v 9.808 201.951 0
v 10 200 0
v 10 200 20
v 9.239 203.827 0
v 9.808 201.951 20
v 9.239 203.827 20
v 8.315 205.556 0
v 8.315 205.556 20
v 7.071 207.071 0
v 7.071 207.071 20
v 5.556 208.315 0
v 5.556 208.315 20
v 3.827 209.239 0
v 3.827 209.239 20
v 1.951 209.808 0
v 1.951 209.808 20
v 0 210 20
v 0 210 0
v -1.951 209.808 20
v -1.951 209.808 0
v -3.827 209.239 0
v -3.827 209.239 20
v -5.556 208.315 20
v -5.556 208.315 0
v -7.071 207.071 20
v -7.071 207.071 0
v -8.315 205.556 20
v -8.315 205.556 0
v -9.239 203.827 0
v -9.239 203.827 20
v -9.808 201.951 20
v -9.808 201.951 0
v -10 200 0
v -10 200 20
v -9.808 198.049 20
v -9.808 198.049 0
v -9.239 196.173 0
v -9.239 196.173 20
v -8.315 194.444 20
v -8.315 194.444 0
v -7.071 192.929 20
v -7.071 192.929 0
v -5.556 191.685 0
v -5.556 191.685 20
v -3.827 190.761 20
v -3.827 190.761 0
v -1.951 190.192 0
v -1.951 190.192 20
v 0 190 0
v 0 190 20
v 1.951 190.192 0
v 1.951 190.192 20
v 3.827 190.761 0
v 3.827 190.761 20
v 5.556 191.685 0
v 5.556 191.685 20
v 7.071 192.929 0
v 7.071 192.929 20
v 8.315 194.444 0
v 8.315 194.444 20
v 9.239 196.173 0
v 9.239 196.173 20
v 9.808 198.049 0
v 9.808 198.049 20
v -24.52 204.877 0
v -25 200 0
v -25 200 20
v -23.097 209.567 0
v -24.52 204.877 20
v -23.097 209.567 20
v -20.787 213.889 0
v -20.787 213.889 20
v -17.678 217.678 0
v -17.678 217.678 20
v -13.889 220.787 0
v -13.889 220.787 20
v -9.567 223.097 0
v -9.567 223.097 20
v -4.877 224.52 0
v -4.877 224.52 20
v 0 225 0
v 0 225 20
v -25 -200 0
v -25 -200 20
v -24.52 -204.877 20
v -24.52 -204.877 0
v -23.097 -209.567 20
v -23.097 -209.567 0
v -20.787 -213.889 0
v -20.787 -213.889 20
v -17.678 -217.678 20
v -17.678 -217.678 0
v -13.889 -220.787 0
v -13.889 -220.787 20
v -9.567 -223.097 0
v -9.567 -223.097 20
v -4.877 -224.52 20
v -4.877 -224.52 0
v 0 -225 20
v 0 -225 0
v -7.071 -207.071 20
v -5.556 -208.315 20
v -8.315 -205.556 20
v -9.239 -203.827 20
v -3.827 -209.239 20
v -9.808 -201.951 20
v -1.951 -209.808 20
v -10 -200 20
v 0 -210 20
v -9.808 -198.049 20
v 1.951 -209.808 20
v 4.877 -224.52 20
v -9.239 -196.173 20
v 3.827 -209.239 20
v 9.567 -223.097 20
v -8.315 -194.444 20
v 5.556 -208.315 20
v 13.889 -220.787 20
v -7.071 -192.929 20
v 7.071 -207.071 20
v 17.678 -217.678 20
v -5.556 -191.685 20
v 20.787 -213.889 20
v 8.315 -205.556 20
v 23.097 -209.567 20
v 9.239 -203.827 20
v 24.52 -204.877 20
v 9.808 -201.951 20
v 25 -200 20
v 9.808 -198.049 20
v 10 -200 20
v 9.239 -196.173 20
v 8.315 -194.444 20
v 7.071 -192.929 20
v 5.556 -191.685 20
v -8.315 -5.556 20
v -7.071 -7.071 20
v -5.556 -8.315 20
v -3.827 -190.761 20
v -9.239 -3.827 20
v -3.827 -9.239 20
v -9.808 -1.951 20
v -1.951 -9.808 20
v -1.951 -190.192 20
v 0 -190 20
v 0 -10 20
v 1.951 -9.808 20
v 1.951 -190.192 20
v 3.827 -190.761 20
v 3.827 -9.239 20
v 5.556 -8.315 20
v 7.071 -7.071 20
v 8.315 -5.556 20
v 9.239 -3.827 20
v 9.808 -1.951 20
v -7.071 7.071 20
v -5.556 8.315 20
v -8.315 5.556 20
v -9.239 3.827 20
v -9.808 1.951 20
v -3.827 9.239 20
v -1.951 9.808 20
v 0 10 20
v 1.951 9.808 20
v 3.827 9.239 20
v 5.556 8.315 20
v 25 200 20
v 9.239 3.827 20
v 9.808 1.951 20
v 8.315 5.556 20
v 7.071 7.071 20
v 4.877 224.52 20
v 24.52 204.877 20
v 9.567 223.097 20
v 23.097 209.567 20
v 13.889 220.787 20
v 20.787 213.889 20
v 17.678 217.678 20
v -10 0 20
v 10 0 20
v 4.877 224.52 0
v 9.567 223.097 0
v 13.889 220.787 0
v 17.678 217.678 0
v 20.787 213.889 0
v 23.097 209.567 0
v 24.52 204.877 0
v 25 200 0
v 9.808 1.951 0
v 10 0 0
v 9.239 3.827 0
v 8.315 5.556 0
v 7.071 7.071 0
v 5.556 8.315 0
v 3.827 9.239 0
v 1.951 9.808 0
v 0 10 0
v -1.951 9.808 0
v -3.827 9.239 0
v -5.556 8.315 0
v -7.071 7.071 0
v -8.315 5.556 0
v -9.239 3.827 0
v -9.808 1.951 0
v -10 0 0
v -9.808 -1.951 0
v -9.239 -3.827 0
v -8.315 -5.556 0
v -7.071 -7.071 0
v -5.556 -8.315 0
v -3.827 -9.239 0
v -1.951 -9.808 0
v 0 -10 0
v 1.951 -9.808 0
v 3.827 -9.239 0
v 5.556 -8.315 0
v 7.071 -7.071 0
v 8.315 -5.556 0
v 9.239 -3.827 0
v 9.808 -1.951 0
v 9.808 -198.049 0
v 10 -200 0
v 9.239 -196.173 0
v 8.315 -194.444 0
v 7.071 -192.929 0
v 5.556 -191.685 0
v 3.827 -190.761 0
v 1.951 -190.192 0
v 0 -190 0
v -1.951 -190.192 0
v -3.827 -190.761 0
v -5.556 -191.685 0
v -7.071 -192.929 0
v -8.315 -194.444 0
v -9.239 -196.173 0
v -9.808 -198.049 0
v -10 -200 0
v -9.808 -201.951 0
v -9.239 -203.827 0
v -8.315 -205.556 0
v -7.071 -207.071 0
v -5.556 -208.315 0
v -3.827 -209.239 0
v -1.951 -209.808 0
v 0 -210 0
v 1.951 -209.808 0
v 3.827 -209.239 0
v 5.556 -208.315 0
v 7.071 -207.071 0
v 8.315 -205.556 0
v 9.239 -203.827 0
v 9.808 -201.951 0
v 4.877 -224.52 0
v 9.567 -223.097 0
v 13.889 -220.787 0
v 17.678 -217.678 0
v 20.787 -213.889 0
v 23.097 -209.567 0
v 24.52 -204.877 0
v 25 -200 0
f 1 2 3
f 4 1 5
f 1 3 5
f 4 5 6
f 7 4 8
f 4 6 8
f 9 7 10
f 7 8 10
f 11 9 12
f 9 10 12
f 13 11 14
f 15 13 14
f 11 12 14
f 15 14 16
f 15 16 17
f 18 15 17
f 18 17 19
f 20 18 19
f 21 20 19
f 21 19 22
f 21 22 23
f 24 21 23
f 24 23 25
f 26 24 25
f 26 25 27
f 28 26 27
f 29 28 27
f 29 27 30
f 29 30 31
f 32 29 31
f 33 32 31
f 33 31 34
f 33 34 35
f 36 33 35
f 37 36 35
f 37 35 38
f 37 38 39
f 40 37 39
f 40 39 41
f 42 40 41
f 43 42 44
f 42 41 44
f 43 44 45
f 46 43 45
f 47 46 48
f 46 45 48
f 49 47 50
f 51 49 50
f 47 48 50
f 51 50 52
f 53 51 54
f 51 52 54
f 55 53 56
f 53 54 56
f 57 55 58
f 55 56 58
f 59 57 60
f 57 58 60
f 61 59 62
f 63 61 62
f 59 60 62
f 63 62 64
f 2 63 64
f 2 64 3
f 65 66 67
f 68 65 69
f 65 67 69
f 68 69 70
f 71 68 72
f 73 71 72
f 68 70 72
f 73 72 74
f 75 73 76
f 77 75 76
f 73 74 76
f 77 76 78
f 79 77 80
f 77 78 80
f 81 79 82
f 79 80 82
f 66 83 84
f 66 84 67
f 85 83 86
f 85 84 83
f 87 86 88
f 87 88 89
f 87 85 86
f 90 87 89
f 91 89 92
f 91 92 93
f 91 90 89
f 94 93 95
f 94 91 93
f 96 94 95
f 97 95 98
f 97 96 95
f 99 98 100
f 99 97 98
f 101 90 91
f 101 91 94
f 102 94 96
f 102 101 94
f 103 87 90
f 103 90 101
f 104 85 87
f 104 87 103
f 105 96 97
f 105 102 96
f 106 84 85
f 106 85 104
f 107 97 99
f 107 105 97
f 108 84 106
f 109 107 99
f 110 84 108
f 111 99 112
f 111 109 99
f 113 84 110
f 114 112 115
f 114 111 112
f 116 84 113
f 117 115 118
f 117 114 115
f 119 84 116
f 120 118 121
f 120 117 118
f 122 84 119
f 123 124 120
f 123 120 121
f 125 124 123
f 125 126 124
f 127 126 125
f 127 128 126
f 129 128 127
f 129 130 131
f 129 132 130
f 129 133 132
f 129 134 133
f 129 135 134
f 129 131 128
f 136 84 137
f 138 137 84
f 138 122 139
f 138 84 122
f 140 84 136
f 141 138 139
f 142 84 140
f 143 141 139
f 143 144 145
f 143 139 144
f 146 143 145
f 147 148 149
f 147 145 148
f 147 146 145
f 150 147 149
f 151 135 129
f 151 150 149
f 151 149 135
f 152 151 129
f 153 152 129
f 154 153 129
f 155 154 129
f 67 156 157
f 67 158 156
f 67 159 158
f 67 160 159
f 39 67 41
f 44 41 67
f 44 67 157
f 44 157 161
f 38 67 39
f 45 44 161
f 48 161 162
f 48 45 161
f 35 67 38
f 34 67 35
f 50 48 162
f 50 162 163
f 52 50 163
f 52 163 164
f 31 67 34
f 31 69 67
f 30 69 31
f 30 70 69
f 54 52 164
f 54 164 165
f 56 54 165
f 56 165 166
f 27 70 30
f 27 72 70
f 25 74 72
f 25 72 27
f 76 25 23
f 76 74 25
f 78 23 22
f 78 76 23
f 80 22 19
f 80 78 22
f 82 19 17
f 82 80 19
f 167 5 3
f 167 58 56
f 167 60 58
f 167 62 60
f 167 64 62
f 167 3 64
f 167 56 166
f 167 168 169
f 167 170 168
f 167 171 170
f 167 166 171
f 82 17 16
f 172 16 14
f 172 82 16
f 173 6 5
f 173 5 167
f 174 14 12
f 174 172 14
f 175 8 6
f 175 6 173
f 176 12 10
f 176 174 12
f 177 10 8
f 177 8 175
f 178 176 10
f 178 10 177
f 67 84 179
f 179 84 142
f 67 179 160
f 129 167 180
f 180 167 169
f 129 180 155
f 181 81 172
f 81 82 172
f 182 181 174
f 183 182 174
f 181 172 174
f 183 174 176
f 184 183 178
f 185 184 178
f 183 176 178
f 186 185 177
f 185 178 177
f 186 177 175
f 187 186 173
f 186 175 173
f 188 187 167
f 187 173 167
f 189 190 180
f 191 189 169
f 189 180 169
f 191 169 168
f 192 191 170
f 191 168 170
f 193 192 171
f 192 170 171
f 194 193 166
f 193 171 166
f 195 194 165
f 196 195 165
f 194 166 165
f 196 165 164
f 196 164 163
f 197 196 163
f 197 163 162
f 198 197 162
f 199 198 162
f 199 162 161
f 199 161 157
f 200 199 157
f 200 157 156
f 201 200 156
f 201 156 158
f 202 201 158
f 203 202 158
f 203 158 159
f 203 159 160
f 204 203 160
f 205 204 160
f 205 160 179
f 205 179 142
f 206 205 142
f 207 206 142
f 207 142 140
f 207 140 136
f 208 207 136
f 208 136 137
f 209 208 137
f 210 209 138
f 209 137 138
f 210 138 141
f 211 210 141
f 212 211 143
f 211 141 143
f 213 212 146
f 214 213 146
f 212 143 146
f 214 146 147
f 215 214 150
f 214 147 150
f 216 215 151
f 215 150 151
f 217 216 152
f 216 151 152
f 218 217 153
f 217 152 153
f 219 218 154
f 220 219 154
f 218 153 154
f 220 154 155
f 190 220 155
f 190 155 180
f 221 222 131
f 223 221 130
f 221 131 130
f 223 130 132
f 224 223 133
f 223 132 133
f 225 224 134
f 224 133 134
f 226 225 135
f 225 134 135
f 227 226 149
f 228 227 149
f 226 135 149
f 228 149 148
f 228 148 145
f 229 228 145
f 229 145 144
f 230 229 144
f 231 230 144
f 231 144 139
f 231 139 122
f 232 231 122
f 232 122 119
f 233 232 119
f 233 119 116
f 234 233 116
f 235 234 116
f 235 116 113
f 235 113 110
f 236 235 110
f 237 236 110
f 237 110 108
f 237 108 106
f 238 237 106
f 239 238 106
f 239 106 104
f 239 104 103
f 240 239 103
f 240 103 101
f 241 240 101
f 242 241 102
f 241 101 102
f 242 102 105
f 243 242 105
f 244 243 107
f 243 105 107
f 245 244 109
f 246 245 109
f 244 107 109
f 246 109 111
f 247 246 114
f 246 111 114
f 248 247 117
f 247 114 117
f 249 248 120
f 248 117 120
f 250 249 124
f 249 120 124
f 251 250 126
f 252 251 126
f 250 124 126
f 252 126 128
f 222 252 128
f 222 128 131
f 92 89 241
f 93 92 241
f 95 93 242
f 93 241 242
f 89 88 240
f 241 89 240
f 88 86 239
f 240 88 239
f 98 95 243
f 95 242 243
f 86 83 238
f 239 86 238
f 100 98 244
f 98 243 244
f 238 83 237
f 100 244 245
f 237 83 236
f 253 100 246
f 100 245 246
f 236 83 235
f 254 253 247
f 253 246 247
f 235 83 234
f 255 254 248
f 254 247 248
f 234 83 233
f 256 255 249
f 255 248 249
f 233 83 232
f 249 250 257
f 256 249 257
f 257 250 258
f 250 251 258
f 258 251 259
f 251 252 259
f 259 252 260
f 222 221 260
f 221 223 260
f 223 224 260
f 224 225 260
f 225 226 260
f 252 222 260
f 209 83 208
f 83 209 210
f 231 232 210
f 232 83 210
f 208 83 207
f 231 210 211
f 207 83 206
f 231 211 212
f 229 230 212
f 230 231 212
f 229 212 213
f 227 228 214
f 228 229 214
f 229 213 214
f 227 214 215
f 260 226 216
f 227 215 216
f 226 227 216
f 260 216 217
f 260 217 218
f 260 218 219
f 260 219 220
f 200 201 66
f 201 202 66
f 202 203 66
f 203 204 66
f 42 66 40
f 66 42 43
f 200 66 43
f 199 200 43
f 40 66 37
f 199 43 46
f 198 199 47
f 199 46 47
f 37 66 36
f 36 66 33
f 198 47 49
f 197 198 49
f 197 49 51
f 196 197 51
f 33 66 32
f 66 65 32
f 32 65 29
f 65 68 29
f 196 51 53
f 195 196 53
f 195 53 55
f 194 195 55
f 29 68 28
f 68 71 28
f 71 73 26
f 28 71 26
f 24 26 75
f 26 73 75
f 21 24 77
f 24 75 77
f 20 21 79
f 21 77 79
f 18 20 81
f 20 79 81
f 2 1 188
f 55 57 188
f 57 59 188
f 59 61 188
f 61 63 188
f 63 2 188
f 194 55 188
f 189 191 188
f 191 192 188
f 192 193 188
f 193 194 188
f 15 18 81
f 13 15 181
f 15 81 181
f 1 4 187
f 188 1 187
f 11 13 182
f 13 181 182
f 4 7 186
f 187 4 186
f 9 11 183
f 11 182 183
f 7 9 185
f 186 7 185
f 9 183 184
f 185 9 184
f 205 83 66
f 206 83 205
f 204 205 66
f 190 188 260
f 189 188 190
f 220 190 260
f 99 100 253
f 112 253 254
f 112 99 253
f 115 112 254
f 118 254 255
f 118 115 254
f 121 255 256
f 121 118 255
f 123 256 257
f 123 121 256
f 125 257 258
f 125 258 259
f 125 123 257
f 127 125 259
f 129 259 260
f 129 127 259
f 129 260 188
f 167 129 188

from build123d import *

# Parameters (mm, degrees)
ESQUISSE1_W             = 50
ESQUISSE1_H             = 450
BOSS_EXTRU_1_DEPTH      = 20
ENL_V_MAT_EXTRU_1_REACH = 229.266
ESQUISSE2_R             = 10
CONG_1_R                = 25


with BuildPart() as part:
    # Esquisse1 → Boss.-Extru.1 (new body)
    with BuildSketch(Plane.XY):
        Rectangle(ESQUISSE1_W, ESQUISSE1_H)
    extrude(amount=BOSS_EXTRU_1_DEPTH)

    # Esquisse2 → Enlèv. mat.-Extru.1 (cut, up to next)
    with BuildSketch(Plane.XY.offset(20), mode=Mode.PRIVATE) as enl_v_mat_extru_1_sk1:
        with Locations((0, -200)):
            Circle(ESQUISSE2_R)
    enl_v_mat_extru_1_tool1 = extrude(enl_v_mat_extru_1_sk1.sketch, amount=-ENL_V_MAT_EXTRU_1_REACH, mode=Mode.PRIVATE) & part.part
    # Esquisse2 → Enlèv. mat.-Extru.1 (cut, up to next)
    with BuildSketch(Plane.XY.offset(20), mode=Mode.PRIVATE) as enl_v_mat_extru_1_sk2:
        with Locations((0, 200)):
            Circle(ESQUISSE2_R)
    enl_v_mat_extru_1_tool2 = extrude(enl_v_mat_extru_1_sk2.sketch, amount=-ENL_V_MAT_EXTRU_1_REACH, mode=Mode.PRIVATE) & part.part
    # Esquisse2 → Enlèv. mat.-Extru.1 (cut, up to next)
    with BuildSketch(Plane.XY.offset(20), mode=Mode.PRIVATE) as enl_v_mat_extru_1_sk3:
        Circle(ESQUISSE2_R)
    enl_v_mat_extru_1_tool3 = extrude(enl_v_mat_extru_1_sk3.sketch, amount=-ENL_V_MAT_EXTRU_1_REACH, mode=Mode.PRIVATE) & part.part
    add(enl_v_mat_extru_1_tool1.solids().sort_by_distance((0, -200, 20))[0], mode=Mode.SUBTRACT)
    add(enl_v_mat_extru_1_tool2.solids().sort_by_distance((0, 200, 20))[0], mode=Mode.SUBTRACT)
    add(enl_v_mat_extru_1_tool3.solids().sort_by_distance((0, 0, 20))[0], mode=Mode.SUBTRACT)

    # Congé1
    cong_1_edges = [part.edges().sort_by_distance(p)[0] for p in [
        (-25, -225, 10),
        (25, -225, 10),
        (-25, 225, 10),
        (25, 225, 10),
    ]]
    fillet(cong_1_edges, radius=CONG_1_R - 0.0001)  # a hair under: the kernel refuses the full size


solid = part.part
